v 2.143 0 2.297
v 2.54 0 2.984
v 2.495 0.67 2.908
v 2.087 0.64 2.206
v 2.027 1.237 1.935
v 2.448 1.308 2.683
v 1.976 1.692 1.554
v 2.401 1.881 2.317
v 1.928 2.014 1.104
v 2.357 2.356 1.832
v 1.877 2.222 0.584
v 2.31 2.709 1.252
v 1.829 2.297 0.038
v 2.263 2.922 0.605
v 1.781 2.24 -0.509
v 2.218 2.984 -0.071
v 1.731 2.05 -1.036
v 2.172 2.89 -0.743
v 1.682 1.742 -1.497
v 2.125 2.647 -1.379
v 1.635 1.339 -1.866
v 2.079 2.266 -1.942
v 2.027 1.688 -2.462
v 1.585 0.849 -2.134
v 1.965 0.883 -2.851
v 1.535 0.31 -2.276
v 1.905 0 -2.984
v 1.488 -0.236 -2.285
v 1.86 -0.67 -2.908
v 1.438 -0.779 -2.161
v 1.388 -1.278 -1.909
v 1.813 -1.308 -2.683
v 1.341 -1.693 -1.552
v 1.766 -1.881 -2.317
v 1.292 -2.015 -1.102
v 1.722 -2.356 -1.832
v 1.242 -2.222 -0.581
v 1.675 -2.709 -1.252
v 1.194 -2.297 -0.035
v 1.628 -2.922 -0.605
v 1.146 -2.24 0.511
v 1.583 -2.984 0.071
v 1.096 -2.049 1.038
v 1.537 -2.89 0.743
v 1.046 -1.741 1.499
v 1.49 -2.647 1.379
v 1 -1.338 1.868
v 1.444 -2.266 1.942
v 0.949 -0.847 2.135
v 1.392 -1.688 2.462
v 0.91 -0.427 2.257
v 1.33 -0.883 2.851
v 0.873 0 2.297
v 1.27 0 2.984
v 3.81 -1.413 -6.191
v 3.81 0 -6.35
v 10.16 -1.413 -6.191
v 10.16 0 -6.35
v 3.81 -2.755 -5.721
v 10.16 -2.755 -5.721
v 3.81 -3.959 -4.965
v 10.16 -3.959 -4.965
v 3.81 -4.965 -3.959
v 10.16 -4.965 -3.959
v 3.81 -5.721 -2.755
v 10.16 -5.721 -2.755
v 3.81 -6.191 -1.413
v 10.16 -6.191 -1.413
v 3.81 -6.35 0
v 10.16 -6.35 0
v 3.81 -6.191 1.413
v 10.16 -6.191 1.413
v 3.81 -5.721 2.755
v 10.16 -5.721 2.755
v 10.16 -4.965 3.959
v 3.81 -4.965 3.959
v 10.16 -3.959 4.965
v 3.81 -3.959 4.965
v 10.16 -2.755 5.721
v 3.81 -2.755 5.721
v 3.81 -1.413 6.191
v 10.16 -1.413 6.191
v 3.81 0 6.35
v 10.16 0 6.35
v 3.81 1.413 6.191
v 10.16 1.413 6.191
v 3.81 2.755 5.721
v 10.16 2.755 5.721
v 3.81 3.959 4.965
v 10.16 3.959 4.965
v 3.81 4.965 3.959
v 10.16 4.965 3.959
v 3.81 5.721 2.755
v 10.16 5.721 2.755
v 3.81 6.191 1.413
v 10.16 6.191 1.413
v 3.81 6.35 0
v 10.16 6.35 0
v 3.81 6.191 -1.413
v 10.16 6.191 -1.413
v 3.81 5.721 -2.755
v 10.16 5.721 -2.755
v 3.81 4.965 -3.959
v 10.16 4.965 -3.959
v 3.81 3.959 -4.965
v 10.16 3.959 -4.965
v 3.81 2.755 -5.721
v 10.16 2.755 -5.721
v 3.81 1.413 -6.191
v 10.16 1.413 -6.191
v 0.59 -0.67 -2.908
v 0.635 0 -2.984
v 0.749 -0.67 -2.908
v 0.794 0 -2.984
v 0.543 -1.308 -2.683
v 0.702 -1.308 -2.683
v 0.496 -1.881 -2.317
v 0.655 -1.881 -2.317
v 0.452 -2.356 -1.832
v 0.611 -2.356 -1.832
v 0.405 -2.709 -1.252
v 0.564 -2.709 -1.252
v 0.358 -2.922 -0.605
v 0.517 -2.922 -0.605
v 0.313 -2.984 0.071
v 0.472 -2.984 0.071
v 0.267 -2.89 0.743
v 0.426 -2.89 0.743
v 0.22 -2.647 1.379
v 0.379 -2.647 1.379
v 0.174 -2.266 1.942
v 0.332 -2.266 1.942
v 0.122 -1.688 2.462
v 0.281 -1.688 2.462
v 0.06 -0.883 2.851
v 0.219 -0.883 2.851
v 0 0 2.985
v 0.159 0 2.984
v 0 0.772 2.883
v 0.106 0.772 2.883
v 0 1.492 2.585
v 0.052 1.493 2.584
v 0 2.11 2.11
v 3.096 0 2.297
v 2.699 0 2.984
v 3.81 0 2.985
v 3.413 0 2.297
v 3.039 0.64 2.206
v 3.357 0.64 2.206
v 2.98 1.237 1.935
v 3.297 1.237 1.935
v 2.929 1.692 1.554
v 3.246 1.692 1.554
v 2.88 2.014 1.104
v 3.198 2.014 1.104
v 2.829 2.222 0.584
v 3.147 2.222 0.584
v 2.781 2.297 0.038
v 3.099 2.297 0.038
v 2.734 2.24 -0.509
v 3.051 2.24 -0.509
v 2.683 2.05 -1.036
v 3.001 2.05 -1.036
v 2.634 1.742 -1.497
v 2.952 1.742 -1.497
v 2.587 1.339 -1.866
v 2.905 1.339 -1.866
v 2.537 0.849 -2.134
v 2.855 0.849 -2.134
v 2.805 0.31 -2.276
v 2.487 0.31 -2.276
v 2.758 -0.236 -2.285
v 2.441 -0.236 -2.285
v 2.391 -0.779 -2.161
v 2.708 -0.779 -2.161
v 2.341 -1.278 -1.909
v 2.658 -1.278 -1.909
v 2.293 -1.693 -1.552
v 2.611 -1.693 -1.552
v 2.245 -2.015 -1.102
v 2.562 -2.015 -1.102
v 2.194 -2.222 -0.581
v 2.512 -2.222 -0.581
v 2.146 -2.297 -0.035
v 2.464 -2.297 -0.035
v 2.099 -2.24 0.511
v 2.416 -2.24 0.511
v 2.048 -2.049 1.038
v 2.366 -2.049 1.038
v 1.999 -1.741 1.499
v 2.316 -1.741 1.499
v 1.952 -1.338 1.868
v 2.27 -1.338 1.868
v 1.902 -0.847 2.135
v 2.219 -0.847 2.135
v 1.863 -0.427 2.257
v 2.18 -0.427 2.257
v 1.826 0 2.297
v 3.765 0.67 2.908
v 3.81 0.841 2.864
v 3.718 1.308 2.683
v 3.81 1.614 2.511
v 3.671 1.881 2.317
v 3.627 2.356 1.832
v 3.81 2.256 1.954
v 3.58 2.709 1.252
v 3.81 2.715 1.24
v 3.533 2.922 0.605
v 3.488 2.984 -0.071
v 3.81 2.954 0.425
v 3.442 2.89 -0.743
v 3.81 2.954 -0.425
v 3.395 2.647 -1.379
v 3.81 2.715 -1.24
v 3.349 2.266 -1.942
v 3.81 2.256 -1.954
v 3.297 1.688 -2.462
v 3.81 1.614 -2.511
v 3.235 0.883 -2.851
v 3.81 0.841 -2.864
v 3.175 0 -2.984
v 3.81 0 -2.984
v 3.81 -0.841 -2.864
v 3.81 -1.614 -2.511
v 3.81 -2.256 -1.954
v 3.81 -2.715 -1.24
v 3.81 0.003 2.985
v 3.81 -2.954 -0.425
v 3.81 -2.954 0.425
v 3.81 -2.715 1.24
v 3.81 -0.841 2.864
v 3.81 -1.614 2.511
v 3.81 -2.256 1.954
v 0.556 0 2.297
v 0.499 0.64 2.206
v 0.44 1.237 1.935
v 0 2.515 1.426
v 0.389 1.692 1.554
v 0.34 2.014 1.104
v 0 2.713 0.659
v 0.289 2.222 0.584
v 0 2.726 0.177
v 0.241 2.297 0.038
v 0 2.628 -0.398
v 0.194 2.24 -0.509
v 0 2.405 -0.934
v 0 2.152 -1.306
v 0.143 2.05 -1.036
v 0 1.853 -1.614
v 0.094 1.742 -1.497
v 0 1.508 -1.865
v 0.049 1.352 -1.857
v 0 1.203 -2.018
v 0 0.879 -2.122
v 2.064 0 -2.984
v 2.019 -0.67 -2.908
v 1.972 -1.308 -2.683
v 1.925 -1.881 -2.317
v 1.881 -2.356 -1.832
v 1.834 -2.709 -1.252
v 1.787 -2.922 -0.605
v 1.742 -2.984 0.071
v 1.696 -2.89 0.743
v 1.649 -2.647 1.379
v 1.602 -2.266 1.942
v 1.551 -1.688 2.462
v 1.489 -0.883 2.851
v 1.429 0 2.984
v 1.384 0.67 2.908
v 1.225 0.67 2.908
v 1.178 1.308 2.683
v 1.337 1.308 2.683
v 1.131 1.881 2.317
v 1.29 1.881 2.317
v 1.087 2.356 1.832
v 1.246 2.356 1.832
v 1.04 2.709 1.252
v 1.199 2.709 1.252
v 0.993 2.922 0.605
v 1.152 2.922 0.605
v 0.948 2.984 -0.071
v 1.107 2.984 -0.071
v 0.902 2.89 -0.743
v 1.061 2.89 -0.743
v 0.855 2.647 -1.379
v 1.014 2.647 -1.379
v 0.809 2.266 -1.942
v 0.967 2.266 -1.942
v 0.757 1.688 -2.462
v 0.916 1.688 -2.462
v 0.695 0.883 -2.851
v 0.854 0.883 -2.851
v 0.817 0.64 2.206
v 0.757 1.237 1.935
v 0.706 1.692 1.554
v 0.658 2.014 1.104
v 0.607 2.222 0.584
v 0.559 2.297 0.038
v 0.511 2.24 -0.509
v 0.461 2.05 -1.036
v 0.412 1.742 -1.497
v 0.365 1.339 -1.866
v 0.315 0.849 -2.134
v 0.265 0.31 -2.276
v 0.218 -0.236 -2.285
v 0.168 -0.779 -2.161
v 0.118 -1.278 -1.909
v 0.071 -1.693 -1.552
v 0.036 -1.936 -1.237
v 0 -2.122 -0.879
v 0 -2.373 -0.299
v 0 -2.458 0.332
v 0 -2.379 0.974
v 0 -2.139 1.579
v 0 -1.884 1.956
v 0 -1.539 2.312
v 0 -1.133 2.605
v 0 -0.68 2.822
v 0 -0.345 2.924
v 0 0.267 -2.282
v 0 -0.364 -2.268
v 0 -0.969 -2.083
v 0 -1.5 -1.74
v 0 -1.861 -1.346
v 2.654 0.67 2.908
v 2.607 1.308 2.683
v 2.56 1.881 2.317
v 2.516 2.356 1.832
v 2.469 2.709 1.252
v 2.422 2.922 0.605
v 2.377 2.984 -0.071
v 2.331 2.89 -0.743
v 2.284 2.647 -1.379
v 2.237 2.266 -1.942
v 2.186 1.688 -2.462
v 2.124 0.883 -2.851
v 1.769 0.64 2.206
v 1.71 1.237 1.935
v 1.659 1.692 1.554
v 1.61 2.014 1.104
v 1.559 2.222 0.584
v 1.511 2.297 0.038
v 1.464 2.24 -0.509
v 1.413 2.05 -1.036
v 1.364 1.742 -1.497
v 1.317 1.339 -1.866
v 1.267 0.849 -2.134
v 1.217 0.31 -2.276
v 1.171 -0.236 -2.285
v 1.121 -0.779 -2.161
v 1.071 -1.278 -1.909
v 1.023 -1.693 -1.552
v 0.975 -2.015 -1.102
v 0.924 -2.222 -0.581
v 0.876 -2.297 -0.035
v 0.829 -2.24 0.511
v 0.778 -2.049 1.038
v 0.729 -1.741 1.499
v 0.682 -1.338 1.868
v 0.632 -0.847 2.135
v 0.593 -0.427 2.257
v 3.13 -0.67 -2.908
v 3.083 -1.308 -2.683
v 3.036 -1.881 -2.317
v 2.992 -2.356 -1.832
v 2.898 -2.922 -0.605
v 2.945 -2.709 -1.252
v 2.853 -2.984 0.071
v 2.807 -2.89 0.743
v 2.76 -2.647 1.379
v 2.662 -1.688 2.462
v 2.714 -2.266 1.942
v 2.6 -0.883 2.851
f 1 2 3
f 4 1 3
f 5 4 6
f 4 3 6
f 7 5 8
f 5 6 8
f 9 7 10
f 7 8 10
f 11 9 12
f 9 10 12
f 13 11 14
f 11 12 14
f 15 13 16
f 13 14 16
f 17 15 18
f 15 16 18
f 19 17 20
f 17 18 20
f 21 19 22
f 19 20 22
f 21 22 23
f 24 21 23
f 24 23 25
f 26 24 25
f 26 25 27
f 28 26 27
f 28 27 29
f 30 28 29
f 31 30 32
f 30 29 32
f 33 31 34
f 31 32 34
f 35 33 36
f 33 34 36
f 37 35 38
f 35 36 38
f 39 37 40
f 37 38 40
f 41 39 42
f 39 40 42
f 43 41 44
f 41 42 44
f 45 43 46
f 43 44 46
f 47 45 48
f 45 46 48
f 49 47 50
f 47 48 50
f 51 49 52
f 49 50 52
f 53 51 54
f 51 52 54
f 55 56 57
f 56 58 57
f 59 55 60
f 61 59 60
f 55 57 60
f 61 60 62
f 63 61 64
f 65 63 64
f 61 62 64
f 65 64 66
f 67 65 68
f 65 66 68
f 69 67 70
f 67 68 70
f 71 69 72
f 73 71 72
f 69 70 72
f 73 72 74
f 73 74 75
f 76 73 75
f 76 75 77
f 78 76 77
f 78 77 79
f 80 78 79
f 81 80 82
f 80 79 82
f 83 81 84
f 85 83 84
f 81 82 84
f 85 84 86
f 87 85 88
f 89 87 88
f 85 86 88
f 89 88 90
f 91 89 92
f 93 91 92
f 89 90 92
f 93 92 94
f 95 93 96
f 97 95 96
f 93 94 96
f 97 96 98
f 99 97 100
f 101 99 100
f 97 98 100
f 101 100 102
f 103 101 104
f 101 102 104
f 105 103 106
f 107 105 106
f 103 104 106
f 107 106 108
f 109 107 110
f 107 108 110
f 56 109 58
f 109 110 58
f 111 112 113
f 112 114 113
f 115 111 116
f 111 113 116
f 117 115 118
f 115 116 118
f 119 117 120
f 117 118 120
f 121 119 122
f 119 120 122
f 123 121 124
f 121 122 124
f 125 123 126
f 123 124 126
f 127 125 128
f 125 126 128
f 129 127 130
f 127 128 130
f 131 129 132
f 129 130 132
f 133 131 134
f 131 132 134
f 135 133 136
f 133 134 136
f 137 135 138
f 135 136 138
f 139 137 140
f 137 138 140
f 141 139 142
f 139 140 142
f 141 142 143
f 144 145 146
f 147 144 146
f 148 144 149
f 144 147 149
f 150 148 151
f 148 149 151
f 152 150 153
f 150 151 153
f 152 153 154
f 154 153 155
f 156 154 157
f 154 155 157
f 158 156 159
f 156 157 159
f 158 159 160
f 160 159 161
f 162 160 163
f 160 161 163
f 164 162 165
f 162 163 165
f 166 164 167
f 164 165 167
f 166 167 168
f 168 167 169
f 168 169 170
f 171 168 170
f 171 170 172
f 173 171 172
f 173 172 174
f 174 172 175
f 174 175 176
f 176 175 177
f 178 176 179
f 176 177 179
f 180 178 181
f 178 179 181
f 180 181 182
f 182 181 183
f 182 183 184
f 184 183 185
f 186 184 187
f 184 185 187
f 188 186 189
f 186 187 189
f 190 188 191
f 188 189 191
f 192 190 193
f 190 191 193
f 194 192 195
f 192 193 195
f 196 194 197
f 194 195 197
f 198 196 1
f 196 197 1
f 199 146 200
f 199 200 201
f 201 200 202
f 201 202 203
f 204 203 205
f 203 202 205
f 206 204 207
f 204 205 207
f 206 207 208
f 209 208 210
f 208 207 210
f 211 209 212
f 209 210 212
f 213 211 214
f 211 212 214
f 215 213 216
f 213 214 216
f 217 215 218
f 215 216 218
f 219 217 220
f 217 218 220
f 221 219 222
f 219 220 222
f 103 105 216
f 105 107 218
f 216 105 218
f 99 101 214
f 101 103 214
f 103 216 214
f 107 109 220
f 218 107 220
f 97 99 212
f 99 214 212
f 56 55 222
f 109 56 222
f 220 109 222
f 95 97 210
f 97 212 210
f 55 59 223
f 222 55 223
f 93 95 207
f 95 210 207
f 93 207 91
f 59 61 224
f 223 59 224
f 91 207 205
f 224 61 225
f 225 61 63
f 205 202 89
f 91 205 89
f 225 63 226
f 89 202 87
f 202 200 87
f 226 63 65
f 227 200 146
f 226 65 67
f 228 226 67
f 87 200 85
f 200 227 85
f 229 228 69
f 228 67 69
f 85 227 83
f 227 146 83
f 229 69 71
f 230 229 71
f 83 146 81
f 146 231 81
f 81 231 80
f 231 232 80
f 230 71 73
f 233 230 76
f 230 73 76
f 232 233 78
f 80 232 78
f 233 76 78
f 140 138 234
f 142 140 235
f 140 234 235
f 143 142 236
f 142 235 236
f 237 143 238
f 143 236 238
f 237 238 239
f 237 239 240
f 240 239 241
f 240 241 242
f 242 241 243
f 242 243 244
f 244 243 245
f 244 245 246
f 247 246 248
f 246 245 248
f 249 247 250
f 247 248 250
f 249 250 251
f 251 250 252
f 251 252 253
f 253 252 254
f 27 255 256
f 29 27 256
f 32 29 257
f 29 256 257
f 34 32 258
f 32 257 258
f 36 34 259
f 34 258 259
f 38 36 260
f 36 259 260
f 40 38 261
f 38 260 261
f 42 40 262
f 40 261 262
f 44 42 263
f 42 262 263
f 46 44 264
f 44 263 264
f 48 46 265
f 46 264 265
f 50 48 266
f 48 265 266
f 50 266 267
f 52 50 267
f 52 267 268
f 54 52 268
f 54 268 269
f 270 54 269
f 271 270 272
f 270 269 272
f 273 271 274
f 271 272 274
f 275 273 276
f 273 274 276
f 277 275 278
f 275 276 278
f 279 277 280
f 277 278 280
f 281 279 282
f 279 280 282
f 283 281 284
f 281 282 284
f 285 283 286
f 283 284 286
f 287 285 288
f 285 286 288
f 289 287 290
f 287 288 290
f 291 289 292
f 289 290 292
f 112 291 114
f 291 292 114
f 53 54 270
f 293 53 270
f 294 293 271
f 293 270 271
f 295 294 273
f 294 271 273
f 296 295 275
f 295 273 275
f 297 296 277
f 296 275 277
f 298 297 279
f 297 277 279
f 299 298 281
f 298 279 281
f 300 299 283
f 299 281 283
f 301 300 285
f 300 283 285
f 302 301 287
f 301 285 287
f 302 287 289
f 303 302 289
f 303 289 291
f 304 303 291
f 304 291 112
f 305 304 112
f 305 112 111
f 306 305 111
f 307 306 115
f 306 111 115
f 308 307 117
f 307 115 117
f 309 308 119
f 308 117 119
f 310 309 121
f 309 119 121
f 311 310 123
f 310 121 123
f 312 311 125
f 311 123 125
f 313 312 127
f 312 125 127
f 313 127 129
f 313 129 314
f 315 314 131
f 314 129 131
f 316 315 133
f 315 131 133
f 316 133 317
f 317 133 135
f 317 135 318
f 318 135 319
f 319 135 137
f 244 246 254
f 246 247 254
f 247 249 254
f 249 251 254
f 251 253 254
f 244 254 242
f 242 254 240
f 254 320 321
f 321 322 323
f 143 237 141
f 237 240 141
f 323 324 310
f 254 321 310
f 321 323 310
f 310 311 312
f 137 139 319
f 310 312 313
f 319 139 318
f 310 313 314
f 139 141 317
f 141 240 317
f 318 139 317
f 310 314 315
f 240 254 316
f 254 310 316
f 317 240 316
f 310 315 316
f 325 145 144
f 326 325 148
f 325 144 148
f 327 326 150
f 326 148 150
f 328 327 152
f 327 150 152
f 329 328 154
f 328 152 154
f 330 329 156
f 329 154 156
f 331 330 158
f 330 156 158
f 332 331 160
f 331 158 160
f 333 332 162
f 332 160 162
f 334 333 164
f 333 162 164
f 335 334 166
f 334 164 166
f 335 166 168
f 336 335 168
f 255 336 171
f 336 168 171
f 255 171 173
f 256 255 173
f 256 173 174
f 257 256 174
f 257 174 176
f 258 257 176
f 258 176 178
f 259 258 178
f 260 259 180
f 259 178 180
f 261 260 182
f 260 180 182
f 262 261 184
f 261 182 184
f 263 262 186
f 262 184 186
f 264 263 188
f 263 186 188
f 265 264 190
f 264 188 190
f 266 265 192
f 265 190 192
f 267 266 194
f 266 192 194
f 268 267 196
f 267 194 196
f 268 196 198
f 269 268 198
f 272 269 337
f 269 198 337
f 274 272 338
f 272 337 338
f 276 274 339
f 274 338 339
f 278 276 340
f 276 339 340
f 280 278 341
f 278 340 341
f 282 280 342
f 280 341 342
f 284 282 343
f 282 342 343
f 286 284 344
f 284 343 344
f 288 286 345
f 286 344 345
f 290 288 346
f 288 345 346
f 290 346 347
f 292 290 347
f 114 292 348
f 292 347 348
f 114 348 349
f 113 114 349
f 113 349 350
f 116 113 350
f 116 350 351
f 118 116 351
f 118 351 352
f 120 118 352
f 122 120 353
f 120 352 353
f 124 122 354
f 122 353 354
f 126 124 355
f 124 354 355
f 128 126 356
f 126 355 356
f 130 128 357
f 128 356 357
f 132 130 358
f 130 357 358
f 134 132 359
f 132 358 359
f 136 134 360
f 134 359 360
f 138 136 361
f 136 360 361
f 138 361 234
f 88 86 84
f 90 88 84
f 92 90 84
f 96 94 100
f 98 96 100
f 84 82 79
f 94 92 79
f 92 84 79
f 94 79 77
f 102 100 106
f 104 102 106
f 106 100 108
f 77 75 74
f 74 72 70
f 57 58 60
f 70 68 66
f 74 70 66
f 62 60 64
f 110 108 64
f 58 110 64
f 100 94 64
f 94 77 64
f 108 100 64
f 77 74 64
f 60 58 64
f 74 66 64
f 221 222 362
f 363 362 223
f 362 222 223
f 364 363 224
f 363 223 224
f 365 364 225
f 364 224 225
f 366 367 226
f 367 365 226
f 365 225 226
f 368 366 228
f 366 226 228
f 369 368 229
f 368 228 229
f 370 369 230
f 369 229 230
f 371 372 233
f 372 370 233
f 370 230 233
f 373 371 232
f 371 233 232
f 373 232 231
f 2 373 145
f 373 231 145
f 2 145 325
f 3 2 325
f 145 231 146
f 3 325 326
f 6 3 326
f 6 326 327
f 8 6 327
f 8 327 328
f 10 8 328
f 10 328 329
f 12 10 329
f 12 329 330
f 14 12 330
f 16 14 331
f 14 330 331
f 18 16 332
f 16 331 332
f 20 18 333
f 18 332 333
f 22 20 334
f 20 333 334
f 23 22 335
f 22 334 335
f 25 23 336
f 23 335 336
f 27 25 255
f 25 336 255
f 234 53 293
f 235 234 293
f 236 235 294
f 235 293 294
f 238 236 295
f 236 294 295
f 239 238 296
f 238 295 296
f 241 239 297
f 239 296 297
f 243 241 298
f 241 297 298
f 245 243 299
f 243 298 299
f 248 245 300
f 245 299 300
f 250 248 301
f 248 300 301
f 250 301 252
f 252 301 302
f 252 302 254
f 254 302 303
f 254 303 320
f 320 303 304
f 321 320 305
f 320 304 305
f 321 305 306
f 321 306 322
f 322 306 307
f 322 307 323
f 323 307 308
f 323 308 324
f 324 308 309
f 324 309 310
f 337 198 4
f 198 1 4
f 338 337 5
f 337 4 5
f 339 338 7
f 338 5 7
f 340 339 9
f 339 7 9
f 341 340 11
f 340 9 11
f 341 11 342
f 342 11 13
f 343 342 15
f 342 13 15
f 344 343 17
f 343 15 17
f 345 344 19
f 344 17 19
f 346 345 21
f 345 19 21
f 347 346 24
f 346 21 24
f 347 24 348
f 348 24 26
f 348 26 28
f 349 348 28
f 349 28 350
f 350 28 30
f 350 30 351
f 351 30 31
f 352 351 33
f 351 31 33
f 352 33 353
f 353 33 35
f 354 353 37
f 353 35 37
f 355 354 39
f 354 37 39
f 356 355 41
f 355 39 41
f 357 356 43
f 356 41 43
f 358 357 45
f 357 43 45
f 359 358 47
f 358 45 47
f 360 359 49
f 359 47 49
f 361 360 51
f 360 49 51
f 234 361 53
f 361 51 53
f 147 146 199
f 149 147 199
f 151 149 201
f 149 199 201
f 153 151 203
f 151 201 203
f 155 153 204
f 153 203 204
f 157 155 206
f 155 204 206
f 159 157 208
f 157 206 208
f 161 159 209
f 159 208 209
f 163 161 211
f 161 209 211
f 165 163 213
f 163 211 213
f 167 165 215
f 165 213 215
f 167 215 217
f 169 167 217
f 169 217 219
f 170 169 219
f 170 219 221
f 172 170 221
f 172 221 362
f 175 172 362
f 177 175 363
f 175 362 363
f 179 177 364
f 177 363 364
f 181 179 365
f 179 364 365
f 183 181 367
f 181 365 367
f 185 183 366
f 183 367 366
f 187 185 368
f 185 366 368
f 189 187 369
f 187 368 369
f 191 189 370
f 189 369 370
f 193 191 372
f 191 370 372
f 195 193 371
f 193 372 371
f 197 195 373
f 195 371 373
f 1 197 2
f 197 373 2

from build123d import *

# Parameters (mm, degrees)
THREAD1_PITCH = 1.27


with BuildPart() as part:
    # Sketch1 → Revolve1 (revolve)
    with BuildSketch(Plane.XY, mode=Mode.PRIVATE) as revolve1_sk:
        Polygon((0, 0), (0, 2.9845), (3.81, 2.9845), (3.81, 6.35), (10.16, 6.35), (10.16, 0), align=None)
    revolve(revolve1_sk.sketch.rotate(Axis((10.16, 0, 0), (-1, 0, 0)), 90), axis=Axis((10.16, 0, 0), (-1, 0, 0)))

    # Thread1: the profile of Thread Profile1 profile screwed along a right-hand helix of 3 turns, 8 arcs to a turn; built about Z, then put on its axis
    thread1_z = Axis((0, 0, 0), (0, 0, 1))
    thread1_corners = [(2.9848, 0, -0.000173205), (2.9848, 0, 1.111423202), (2.297092339, 0, 0.714374998), (2.297092339, 0, 0.396874998)]
    with BuildLine(mode=Mode.PRIVATE) as thread1_profile:
        Line(thread1_corners[0], thread1_corners[1])
        Line(thread1_corners[1], thread1_corners[2])
        Line(thread1_corners[2], thread1_corners[3])
        Line(thread1_corners[3], thread1_corners[0])
    thread1_cap = Face(thread1_profile.wire())
    thread1_turn_angles = [0, 22.5, 45, 67.5, 90, 112.5, 135, 157.5, 180, 202.5, 225, 247.5, 270, 292.5, 315, 337.5, 360]
    thread1_turn_weights = [1, 0.9238795325112867, 1, 0.9238795325112867, 1, 0.9238795325112867, 1, 0.9238795325112867, 1, 0.9238795325112867, 1, 0.9238795325112867, 1, 0.9238795325112867, 1, 0.9238795325112867, 1]
    thread1_turn_rails = [Edge.make_bspline([Vector(p[0], p[1], 0).rotate(thread1_z, thread1_turn_angles[k]) / thread1_turn_weights[k] + Vector(0, 0, p[2] + THREAD1_PITCH * thread1_turn_angles[k] / 360) for k in range(17)], [0, 0, 0, 1, 1, 2, 2, 3, 3, 4, 4, 5, 5, 6, 6, 7, 7, 8, 8, 8], 2, thread1_turn_weights) for p in thread1_corners]
    thread1_turn_sides = [Face.make_surface_from_curves(thread1_turn_rails[p[0]], thread1_turn_rails[p[1]]) for p in [(0, 1), (1, 2), (2, 3), (3, 0)]]
    thread1 = Plane(origin=(3.81, 0, 0), x_dir=(0, 0, 1), z_dir=(-1, 0, 0)) * Solid(Shell([*[p.moved(Location((0, 0, THREAD1_PITCH * i))) for i in range(3) for p in thread1_turn_sides], thread1_cap, thread1_cap.rotate(thread1_z, 1080).moved(Location((0, 0, THREAD1_PITCH * 1080 / 360)))]))
    add(thread1, mode=Mode.SUBTRACT)


solid = part.part
